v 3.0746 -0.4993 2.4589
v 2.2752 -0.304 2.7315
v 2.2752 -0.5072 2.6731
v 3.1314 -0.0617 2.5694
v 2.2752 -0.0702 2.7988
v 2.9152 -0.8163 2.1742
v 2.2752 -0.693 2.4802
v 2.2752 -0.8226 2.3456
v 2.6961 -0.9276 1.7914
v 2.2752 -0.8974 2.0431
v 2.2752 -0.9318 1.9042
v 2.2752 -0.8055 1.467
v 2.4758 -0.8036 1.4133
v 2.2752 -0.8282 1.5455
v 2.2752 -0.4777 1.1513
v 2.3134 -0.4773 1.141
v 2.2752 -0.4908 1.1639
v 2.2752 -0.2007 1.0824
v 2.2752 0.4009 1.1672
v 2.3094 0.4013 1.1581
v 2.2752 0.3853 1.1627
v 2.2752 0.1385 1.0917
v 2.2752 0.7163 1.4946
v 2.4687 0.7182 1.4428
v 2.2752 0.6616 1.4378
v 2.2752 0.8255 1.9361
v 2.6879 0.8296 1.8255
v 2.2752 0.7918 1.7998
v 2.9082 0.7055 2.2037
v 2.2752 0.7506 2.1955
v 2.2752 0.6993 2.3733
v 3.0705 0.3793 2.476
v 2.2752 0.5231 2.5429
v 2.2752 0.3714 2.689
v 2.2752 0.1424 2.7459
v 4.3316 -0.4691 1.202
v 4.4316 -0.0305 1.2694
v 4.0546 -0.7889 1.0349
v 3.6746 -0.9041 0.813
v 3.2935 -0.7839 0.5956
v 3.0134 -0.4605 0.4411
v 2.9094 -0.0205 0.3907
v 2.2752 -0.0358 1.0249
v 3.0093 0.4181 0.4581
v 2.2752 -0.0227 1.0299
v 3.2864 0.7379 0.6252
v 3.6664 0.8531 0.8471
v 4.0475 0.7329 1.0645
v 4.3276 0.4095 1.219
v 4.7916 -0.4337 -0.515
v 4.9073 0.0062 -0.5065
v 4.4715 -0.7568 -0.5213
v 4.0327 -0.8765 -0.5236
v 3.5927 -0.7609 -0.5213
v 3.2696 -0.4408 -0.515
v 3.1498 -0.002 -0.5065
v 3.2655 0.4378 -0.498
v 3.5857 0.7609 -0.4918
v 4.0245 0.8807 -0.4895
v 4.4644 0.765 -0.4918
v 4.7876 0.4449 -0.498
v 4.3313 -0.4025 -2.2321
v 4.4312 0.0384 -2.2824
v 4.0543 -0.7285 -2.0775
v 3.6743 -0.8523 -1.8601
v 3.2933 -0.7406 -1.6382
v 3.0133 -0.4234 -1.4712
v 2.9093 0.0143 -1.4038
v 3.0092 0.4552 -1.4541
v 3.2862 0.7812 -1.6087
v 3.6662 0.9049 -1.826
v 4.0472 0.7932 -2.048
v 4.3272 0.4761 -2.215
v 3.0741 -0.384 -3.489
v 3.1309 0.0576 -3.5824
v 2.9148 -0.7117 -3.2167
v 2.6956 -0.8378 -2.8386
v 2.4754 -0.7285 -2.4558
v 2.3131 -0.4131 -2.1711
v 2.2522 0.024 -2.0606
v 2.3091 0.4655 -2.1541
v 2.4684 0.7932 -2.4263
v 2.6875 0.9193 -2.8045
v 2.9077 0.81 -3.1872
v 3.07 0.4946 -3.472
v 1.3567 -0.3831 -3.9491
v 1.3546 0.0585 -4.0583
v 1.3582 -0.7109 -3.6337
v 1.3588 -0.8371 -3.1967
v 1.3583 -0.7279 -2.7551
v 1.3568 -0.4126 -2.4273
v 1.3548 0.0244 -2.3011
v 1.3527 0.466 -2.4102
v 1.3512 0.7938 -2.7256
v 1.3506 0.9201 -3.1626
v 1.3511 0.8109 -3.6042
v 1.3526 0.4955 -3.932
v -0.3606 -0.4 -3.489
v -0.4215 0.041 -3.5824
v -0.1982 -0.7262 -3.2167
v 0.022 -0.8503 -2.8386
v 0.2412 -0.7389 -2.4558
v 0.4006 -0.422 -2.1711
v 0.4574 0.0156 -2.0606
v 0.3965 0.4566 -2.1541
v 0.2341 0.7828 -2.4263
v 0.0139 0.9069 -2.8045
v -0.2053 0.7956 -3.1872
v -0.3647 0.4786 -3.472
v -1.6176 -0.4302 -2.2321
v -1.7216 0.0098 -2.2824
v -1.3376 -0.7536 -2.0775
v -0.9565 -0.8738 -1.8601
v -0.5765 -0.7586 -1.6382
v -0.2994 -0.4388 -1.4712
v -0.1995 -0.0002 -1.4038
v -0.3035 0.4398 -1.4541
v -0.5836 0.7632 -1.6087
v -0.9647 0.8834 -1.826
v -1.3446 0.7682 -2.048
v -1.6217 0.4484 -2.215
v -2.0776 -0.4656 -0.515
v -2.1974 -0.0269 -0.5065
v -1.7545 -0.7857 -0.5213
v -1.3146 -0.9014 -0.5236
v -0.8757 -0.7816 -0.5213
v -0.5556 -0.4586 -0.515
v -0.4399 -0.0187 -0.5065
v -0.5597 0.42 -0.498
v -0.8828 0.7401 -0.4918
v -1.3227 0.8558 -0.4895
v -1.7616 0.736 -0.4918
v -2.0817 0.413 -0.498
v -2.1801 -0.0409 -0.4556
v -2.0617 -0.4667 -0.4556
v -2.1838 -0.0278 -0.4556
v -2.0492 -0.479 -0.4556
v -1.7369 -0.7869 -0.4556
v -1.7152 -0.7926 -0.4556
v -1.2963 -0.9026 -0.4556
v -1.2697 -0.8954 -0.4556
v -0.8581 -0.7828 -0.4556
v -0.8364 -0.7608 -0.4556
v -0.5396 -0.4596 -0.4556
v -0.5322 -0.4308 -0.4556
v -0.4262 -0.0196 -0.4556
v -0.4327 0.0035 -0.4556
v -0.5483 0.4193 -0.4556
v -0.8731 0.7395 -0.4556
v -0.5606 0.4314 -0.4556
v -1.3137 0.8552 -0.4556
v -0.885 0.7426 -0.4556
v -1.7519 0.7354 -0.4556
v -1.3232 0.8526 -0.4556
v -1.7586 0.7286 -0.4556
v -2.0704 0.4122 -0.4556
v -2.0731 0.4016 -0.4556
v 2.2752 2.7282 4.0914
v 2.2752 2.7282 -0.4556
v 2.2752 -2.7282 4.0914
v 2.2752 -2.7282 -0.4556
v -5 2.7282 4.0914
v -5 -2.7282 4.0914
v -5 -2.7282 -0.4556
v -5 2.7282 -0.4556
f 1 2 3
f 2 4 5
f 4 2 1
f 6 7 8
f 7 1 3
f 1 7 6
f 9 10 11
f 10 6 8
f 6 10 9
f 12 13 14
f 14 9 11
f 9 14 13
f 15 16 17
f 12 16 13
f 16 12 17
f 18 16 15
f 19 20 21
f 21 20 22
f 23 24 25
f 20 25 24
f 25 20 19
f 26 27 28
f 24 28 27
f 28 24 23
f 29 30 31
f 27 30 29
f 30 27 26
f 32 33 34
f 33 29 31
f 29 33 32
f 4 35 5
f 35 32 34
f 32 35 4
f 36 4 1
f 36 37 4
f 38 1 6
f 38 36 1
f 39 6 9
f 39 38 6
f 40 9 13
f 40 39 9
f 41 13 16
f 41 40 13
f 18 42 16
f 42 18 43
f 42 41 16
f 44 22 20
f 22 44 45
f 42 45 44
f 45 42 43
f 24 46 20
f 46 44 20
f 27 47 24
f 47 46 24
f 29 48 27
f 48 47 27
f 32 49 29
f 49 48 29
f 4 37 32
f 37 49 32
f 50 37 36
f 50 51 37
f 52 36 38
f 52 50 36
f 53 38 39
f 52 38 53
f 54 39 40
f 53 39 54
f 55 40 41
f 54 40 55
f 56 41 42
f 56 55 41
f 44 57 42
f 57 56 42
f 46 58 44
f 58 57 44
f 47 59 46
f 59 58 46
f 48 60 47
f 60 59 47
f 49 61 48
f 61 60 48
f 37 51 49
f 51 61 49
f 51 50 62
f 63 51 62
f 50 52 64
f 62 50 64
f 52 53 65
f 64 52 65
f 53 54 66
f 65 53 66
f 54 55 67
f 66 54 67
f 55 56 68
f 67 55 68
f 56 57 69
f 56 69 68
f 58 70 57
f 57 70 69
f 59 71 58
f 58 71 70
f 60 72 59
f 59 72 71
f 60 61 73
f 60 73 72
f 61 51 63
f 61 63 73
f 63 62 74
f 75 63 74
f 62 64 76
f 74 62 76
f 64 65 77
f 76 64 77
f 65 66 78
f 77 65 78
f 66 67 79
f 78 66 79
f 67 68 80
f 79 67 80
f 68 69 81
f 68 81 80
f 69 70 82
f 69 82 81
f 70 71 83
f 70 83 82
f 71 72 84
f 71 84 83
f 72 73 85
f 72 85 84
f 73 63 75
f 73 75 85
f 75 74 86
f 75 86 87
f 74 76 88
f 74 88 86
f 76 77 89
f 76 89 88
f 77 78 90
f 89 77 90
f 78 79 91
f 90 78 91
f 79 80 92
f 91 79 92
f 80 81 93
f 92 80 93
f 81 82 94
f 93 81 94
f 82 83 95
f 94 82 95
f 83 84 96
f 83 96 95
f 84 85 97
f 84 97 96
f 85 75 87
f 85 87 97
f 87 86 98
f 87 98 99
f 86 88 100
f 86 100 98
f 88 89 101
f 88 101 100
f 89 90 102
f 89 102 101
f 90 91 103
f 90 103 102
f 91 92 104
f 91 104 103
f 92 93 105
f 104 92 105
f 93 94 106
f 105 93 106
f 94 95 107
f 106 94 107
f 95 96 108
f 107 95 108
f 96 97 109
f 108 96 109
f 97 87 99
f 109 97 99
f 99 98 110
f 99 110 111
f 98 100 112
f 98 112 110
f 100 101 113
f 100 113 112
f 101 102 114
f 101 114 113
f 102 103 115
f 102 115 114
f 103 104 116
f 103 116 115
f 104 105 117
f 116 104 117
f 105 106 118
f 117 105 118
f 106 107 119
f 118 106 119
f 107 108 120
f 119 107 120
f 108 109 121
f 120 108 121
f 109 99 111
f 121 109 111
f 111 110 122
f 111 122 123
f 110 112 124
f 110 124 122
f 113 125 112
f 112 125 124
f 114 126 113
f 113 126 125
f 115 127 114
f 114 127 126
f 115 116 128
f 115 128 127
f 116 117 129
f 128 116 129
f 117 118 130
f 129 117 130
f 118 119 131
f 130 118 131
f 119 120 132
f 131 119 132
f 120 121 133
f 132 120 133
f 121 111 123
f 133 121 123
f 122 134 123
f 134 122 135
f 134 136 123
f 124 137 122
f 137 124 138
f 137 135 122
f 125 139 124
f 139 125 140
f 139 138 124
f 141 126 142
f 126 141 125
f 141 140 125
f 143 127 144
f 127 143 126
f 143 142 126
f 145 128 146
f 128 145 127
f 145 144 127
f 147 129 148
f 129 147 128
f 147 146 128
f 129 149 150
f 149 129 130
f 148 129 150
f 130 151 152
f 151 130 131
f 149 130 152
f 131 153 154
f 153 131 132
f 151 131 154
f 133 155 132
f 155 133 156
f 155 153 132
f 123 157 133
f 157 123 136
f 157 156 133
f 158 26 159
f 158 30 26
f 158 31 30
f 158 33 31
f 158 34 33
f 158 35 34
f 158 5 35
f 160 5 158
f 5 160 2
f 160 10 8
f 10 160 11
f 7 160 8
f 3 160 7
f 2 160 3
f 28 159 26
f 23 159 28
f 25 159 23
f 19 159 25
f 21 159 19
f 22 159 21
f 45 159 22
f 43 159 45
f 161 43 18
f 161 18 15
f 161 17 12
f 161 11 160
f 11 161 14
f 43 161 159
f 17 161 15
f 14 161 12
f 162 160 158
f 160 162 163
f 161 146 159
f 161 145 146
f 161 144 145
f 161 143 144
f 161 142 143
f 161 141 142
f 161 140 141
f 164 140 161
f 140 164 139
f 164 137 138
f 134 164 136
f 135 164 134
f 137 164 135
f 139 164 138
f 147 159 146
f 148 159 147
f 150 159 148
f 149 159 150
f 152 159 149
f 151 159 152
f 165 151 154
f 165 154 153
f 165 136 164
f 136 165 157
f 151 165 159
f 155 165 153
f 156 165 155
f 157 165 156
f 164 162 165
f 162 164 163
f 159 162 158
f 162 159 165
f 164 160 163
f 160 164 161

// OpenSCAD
// Begin.
union() {
translate([1.35496, -0.01036, -0.50652])
rotate([0, 1.11102, -89.7335])
rotate([0, 90, 0])
rotate_extrude($fn = 12)
translate([2.67364, 0, 0])
circle(r = 0.87877, $fn = 12);

rotate([0, -0, 0])
translate([-1.36239, 0, 1.8179])
cube(size = [7.27523, 5.45642, 4.54702], center = true);
}
// End.
